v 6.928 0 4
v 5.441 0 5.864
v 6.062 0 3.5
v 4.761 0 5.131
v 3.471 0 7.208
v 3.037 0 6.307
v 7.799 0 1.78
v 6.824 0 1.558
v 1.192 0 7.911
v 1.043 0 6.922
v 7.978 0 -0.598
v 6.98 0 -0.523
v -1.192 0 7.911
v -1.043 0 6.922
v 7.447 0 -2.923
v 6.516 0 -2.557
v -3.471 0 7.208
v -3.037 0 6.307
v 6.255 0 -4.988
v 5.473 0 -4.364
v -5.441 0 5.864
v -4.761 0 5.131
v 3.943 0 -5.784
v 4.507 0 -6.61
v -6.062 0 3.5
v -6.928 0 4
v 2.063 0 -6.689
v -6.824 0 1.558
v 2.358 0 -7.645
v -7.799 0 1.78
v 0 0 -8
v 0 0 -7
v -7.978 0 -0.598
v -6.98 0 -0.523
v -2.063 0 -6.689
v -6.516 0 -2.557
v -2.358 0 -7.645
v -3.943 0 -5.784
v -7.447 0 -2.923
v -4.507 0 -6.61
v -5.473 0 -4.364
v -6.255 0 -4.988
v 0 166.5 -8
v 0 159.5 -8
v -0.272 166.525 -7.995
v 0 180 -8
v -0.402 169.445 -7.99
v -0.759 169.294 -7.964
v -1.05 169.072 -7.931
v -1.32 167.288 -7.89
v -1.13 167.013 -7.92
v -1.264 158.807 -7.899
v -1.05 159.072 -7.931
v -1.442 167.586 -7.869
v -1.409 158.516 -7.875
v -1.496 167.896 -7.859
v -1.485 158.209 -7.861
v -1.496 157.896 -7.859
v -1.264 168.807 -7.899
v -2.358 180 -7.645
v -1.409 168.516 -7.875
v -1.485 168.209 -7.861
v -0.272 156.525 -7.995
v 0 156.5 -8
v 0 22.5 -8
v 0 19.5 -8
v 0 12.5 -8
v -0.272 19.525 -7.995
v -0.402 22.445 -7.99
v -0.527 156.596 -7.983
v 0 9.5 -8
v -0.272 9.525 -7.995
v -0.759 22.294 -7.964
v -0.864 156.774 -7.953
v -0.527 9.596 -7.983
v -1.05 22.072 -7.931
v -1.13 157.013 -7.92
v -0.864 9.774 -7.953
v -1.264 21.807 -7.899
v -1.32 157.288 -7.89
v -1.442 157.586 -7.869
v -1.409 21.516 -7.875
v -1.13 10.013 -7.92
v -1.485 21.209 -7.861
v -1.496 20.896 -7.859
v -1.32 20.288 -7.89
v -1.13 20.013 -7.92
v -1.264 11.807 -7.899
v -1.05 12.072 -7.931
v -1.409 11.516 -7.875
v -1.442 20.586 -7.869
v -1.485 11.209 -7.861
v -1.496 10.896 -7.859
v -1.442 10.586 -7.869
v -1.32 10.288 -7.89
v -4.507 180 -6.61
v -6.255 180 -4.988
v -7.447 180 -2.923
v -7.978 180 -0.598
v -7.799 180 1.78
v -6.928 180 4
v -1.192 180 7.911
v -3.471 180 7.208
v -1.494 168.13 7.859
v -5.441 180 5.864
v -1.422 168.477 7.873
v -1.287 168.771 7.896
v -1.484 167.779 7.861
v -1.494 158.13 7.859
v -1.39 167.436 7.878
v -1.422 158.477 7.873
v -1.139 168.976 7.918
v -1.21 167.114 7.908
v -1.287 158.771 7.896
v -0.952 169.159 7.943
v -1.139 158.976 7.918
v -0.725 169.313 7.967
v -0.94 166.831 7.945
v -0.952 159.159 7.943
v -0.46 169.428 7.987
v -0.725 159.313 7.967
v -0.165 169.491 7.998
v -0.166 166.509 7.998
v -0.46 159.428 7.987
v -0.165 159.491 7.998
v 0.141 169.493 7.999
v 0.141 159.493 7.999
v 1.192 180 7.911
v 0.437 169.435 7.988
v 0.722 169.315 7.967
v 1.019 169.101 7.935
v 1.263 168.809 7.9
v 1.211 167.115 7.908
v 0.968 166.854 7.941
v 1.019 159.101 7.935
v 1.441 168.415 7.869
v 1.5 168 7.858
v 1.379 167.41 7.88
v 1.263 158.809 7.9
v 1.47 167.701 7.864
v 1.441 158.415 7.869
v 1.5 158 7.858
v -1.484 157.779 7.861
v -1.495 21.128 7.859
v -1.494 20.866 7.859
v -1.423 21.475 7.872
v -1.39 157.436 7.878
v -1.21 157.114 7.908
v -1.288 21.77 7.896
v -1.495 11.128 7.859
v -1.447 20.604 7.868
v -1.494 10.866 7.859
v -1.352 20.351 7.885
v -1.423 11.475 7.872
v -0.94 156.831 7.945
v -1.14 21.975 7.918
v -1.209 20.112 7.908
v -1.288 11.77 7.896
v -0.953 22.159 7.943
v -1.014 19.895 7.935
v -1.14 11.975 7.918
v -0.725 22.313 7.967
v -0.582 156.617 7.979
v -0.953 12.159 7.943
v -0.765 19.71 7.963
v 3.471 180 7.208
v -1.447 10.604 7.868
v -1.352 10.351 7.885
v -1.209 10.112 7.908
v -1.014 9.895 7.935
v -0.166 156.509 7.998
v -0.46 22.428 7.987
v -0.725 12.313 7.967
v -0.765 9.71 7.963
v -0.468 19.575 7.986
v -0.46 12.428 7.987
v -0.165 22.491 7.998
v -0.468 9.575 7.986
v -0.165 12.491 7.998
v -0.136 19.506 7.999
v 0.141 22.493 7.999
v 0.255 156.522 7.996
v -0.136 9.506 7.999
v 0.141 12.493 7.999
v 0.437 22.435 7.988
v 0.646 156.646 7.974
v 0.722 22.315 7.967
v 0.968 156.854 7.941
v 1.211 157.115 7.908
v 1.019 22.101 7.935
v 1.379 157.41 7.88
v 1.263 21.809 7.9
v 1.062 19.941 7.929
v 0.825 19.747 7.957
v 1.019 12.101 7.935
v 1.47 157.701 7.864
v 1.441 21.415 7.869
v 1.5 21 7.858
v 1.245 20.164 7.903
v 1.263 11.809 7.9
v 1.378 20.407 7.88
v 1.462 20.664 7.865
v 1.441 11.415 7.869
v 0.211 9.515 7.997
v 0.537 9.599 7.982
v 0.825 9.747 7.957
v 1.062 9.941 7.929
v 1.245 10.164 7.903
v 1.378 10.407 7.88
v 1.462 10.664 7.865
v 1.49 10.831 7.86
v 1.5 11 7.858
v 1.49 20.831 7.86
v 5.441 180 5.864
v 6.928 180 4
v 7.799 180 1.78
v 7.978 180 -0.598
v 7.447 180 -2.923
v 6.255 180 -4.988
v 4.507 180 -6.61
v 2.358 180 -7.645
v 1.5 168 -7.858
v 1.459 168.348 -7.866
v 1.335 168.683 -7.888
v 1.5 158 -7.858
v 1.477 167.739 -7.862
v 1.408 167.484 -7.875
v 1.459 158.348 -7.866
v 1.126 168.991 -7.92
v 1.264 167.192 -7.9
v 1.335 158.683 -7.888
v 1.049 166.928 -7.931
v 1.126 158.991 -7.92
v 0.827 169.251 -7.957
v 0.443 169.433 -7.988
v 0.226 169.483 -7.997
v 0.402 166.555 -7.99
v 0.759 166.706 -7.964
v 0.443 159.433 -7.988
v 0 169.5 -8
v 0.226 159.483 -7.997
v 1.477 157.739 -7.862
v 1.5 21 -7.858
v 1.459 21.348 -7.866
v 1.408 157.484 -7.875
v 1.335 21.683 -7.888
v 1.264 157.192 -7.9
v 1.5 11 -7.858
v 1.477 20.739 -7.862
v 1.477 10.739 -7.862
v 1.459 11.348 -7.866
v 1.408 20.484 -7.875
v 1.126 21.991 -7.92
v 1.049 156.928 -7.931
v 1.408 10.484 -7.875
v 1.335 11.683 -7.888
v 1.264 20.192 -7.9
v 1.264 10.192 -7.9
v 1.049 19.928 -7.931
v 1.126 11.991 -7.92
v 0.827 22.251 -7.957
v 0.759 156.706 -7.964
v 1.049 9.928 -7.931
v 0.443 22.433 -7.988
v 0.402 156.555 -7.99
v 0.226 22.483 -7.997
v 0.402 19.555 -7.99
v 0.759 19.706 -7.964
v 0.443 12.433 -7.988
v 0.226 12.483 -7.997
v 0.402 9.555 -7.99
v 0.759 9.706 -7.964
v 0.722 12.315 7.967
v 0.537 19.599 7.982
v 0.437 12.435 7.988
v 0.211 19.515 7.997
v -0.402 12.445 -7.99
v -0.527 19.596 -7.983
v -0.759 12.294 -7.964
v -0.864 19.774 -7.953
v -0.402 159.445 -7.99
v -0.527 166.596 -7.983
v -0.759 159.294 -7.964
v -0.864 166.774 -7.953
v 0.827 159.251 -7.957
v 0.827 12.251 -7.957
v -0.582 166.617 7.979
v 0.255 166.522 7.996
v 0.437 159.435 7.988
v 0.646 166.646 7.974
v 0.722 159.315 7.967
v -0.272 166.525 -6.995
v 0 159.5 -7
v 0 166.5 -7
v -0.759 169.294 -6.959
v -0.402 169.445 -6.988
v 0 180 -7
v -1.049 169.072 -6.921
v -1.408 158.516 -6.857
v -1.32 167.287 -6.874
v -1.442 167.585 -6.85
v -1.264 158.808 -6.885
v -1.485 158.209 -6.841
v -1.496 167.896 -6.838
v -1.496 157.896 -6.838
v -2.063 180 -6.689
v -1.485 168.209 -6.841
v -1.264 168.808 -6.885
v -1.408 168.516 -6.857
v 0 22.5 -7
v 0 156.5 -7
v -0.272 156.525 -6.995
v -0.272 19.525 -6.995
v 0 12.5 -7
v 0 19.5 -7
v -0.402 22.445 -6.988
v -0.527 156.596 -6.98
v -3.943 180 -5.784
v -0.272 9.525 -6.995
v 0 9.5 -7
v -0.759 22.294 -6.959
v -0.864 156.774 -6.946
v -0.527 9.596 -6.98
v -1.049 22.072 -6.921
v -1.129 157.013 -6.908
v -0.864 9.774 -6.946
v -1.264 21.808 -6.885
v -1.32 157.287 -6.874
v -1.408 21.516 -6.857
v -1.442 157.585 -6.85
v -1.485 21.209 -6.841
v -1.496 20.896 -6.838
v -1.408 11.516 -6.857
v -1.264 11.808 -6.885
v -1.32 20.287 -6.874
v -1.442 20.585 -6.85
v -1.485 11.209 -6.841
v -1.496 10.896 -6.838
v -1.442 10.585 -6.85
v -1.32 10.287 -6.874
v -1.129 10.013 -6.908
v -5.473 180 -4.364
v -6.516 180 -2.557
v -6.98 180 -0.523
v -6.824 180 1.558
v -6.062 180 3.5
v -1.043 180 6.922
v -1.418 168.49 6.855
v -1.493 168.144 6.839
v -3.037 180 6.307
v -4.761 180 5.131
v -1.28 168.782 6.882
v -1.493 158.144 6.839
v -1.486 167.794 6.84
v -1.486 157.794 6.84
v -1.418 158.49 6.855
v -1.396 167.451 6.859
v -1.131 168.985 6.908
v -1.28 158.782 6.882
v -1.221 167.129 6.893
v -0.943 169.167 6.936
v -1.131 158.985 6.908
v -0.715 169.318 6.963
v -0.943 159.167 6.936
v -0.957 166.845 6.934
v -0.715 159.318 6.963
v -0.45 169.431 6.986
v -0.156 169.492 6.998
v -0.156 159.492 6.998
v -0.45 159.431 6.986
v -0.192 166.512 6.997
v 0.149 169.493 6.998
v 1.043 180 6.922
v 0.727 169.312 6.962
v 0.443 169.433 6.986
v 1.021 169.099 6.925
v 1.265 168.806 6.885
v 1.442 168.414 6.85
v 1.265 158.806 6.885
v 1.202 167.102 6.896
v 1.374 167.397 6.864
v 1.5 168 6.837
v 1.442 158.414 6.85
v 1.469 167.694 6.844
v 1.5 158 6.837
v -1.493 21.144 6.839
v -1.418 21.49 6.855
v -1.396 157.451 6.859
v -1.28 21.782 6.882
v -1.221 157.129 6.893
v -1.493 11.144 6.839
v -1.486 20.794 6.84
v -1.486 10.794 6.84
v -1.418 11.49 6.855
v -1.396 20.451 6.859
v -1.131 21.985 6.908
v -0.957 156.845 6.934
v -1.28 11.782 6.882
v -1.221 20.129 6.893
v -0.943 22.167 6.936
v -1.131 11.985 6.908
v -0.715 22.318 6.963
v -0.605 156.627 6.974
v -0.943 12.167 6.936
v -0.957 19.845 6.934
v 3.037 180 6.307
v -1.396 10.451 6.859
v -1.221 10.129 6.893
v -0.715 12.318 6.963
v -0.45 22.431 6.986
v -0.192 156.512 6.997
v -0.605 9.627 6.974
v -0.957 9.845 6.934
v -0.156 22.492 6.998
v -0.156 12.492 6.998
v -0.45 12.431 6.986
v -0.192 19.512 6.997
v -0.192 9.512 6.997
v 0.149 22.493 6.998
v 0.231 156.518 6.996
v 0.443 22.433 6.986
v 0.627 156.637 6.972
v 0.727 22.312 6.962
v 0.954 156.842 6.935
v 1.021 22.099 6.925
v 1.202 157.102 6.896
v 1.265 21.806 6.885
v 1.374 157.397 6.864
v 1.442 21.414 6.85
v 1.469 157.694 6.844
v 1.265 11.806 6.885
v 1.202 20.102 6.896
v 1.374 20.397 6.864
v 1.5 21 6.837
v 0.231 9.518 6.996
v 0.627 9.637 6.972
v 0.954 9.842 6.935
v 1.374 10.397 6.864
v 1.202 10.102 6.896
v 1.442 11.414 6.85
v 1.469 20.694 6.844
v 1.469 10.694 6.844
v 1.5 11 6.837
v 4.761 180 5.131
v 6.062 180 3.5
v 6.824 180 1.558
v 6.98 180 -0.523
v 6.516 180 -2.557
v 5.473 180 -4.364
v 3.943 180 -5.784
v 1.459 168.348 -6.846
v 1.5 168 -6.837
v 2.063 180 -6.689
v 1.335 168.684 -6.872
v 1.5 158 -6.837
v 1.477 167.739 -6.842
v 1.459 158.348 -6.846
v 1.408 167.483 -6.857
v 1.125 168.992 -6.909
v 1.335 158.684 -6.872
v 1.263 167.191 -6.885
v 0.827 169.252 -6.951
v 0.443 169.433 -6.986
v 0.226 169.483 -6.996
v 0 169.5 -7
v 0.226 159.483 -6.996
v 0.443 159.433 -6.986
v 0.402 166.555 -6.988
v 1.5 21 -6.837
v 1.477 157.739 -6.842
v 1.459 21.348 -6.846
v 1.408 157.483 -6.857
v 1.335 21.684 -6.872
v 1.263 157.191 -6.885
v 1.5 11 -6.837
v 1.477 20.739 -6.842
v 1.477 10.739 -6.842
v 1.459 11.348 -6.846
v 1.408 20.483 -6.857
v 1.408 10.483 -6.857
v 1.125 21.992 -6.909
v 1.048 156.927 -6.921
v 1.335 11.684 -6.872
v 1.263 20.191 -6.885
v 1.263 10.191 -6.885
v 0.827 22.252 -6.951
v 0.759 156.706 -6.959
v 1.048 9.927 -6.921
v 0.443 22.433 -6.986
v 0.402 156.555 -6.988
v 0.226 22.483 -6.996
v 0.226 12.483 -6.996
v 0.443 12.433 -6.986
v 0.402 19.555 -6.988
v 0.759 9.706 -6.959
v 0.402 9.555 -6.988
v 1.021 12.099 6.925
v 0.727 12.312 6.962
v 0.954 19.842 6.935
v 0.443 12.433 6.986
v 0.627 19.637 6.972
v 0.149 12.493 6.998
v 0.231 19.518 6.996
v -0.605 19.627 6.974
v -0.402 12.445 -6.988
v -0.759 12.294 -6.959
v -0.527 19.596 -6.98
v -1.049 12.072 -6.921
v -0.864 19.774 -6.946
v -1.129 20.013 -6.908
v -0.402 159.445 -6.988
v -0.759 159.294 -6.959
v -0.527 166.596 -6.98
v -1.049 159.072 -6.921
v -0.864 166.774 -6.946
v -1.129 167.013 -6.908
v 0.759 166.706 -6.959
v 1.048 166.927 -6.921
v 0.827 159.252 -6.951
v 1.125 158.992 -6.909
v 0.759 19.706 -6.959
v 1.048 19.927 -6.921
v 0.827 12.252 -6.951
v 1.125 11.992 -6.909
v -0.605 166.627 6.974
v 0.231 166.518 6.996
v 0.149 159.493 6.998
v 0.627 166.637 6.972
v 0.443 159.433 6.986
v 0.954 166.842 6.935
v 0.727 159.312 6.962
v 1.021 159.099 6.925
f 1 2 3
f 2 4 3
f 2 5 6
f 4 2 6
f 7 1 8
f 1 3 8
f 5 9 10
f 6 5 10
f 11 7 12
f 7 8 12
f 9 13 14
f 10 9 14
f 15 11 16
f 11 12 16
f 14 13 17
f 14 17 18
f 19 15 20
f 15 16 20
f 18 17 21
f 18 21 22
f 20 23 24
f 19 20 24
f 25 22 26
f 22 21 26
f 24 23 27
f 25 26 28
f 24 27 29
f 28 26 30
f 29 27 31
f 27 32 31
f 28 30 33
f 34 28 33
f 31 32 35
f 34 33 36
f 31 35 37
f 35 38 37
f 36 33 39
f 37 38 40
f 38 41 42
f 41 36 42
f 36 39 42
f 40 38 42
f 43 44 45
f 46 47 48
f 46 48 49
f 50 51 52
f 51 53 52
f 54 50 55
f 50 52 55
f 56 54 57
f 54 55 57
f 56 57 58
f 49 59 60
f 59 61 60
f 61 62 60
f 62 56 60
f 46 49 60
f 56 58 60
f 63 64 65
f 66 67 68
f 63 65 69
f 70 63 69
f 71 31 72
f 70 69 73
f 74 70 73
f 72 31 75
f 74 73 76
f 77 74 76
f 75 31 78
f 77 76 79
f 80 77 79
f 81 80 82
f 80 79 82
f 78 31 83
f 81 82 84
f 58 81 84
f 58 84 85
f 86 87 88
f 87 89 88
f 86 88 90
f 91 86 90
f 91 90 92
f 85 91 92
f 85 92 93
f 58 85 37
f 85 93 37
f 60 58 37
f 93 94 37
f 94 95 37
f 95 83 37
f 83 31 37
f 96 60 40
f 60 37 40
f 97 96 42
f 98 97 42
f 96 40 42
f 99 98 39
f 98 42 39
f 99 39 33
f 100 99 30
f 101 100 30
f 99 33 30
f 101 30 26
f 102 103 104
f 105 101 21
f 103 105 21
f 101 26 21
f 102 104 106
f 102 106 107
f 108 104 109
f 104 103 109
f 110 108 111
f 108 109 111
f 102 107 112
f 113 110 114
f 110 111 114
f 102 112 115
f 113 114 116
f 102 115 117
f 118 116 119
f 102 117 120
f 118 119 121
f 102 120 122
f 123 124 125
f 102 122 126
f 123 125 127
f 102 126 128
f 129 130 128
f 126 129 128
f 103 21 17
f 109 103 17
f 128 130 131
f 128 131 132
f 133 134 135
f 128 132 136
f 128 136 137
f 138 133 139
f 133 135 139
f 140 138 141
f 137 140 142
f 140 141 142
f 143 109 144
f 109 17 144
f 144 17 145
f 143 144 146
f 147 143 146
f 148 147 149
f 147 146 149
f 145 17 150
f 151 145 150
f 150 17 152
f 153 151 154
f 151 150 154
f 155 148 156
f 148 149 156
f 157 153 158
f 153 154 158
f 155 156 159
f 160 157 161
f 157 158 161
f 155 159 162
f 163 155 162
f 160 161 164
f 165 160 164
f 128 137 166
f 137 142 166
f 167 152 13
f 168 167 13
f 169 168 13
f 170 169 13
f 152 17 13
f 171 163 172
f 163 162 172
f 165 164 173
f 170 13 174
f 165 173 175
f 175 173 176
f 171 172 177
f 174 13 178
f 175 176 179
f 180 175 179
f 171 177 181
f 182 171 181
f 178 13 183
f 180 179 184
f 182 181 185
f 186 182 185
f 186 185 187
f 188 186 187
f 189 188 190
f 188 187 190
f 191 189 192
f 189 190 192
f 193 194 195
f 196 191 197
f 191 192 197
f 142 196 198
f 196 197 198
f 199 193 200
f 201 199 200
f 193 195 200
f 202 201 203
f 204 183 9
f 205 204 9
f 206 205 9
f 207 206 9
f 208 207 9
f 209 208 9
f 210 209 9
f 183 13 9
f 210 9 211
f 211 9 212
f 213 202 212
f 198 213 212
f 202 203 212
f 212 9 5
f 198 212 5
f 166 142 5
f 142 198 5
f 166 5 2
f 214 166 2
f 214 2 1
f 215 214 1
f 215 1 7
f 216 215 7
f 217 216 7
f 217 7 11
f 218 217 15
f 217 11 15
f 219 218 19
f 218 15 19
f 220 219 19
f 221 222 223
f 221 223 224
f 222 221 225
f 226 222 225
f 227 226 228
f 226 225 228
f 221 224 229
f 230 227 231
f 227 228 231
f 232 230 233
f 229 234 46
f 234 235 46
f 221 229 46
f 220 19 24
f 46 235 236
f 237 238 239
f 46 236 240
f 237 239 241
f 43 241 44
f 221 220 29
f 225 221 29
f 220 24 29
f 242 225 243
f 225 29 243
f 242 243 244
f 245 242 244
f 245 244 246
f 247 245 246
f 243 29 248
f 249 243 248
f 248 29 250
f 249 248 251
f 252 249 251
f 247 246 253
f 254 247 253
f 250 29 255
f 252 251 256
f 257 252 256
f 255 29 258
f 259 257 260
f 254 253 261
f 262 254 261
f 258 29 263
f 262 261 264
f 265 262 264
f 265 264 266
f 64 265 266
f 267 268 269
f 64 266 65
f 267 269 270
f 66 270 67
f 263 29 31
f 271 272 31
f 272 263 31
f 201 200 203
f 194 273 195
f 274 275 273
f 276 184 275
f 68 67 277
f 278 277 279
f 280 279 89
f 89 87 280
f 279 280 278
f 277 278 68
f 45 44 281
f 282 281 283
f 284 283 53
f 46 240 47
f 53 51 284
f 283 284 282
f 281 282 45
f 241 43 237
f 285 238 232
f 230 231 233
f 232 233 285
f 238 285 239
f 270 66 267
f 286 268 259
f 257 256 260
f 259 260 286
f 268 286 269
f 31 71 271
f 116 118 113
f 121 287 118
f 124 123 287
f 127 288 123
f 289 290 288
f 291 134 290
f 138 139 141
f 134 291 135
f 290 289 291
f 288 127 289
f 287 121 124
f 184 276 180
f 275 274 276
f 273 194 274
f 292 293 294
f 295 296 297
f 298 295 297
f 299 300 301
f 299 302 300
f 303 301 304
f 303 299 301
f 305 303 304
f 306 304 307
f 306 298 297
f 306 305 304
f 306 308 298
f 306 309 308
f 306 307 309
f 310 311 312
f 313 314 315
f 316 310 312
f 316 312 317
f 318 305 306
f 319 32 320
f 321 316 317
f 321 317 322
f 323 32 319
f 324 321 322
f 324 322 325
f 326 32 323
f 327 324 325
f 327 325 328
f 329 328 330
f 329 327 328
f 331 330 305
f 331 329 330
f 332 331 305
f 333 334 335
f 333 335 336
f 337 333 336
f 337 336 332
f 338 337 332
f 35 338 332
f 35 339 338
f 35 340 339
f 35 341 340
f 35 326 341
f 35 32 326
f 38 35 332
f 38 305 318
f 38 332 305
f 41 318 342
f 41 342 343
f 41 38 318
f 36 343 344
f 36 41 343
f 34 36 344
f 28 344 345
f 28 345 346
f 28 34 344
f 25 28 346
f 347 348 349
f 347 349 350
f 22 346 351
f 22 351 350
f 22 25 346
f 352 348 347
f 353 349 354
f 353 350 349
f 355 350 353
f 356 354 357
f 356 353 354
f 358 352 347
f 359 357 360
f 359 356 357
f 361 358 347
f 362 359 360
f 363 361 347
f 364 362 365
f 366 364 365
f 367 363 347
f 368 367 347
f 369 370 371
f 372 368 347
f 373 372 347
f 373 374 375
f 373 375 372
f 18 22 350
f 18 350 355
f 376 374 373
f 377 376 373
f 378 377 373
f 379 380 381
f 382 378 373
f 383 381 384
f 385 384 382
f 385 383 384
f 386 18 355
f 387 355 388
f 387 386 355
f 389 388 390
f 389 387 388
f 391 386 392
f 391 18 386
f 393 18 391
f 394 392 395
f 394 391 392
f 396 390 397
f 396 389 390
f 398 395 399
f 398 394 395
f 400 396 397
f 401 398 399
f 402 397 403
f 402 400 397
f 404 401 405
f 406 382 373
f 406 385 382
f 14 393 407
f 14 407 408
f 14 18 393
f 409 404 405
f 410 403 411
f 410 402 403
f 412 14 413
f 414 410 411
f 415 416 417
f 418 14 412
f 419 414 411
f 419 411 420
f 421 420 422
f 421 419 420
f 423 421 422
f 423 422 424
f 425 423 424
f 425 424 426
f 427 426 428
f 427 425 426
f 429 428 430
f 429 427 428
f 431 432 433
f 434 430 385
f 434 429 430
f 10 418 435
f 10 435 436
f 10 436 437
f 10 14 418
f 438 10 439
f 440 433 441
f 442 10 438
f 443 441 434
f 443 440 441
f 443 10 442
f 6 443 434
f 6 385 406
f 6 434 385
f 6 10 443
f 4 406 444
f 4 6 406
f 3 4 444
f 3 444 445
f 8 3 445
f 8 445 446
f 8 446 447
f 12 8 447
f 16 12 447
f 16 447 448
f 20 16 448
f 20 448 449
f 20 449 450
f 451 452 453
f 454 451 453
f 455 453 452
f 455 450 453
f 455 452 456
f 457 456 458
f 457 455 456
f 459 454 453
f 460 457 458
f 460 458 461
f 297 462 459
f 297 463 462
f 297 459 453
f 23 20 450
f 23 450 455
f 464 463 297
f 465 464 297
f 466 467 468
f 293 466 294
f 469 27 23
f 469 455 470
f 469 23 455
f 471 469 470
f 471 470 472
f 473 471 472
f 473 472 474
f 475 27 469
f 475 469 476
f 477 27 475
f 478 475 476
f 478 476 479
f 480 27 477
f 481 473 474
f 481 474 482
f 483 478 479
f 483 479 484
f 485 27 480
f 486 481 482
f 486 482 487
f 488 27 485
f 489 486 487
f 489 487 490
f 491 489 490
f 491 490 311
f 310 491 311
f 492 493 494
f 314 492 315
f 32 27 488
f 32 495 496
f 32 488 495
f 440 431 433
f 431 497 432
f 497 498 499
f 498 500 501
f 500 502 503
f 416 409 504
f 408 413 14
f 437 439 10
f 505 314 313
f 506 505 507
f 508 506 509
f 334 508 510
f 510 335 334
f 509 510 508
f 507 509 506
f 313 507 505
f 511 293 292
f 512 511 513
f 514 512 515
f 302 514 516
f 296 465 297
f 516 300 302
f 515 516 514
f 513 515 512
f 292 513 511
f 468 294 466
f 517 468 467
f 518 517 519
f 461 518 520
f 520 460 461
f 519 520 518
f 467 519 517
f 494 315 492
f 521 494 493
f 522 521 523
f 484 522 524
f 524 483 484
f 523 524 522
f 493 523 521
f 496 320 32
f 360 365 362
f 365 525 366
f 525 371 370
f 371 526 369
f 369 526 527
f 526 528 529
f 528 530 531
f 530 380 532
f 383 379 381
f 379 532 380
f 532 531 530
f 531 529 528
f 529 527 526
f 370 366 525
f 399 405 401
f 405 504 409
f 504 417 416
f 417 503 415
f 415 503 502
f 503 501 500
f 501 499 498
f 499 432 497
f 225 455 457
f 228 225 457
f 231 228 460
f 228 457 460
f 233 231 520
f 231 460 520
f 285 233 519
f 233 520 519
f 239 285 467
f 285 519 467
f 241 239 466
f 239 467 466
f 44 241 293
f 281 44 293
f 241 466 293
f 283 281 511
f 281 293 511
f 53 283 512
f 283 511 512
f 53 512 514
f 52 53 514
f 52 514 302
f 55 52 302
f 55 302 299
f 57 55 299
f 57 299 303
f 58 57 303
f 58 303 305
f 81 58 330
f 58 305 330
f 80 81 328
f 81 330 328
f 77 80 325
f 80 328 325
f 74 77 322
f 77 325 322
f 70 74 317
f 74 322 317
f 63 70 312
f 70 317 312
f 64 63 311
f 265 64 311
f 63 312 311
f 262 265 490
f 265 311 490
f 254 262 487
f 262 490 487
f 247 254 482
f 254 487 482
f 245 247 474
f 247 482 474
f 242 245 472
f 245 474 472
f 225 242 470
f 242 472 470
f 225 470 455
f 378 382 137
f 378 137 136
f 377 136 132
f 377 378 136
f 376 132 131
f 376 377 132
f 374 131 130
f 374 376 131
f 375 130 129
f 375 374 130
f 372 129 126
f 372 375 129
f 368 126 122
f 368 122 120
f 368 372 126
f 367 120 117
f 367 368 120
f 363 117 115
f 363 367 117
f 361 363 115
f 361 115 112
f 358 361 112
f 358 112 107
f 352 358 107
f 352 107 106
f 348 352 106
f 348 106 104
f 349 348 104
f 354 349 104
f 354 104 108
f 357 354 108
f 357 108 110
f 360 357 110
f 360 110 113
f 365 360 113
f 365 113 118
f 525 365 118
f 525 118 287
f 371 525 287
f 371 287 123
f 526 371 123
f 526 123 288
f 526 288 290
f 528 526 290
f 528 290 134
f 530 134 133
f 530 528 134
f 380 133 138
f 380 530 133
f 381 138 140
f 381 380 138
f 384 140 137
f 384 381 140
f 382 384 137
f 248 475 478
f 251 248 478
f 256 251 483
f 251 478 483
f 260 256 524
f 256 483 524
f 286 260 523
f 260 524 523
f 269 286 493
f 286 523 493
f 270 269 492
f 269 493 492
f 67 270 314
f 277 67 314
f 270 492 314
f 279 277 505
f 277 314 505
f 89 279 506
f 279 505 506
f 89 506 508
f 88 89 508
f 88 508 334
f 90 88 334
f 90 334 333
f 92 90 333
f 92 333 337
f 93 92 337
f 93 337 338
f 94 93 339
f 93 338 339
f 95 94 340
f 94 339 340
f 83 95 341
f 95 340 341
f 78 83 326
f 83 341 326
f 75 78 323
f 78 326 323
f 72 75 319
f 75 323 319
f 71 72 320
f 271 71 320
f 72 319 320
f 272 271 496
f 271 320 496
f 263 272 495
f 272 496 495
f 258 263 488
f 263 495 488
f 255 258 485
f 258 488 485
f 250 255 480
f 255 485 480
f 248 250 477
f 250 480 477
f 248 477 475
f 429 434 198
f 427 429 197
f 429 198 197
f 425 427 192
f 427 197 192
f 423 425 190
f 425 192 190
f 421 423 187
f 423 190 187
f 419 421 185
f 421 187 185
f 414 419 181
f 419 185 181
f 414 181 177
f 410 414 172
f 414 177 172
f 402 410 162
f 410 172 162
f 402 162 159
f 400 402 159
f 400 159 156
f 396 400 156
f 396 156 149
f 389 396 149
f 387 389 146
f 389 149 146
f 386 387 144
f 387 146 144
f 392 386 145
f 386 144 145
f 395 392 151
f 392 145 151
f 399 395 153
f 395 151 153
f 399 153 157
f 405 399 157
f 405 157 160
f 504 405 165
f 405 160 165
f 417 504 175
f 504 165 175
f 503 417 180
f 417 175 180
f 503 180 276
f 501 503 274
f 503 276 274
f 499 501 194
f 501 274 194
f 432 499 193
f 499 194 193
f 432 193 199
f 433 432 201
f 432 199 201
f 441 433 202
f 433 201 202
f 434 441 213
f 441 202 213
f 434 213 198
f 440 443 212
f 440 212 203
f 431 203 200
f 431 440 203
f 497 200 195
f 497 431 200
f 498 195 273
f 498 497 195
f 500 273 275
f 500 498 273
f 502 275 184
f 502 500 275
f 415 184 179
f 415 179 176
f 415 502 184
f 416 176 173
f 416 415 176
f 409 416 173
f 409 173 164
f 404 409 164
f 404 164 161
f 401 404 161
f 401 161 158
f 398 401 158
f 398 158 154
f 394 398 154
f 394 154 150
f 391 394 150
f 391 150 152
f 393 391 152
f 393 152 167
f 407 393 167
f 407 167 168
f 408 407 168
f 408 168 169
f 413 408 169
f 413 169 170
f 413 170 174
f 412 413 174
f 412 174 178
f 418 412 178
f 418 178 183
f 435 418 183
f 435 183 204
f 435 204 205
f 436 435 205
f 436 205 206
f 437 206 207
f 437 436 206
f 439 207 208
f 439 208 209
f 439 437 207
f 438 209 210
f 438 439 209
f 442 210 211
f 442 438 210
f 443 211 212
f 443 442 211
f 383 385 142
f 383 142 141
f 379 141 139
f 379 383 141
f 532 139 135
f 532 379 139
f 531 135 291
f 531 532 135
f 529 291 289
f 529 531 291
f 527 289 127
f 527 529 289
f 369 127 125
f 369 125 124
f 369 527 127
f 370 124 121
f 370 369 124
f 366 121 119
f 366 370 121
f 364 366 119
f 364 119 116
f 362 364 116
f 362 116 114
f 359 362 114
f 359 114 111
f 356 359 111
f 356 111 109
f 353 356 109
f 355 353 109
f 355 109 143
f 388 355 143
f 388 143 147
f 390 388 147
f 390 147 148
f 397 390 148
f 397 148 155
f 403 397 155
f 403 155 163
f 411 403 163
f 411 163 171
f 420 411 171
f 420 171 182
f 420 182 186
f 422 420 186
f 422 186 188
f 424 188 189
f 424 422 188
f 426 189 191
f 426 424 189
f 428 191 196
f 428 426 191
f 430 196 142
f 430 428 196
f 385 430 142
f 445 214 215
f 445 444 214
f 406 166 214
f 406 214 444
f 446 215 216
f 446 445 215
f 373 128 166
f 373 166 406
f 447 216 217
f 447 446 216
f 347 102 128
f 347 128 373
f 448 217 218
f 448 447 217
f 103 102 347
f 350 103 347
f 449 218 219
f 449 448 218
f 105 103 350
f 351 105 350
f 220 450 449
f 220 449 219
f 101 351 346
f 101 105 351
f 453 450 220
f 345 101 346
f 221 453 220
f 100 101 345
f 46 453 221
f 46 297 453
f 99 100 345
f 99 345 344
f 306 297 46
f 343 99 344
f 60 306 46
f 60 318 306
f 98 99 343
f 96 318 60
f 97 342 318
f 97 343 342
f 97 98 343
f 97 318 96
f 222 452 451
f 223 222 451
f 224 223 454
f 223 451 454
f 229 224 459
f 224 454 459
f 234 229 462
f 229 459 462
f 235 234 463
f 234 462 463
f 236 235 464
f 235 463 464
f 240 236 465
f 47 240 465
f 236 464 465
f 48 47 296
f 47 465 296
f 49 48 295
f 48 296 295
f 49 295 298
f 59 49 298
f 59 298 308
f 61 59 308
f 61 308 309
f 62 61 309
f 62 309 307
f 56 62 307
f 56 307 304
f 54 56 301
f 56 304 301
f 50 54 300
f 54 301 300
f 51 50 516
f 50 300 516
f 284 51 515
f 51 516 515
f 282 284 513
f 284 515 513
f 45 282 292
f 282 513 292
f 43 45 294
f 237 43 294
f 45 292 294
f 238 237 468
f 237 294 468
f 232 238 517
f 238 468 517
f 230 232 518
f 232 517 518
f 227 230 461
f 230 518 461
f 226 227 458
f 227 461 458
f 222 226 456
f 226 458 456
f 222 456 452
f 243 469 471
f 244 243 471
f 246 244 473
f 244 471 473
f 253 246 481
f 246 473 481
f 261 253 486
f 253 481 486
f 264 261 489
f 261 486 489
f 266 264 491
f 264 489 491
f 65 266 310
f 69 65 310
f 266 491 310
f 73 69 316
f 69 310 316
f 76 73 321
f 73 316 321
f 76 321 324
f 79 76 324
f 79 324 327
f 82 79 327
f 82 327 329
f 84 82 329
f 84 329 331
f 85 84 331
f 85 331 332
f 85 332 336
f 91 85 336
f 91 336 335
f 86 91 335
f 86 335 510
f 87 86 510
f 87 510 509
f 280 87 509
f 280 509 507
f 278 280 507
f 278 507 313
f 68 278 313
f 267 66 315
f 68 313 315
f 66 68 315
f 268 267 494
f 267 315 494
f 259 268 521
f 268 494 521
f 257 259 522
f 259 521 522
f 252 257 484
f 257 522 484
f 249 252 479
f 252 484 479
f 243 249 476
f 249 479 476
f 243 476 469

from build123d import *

# Parameters (mm, degrees)
IZIM1_R                     = 8
IZIM1_R_2                   = 7
Y_KSEKLIK_EKSTR_ZYON1_DEPTH = 180
IZIM2_R                     = 1.5
KES_EKSTR_ZYON1_DEPTH       = 10


with BuildPart() as part:
    # Çizim1 → Yükseklik-Ekstrüzyon1 (new body)
    with BuildSketch(Plane(origin=(0, 0, 0), x_dir=(1, 0, 0), z_dir=(0, 1, 0))):
        with Locations(Location((0, 0, 0), (0, 0, 90))):
            Circle(IZIM1_R)
        with Locations(Location((0, 0, 0), (0, 0, 90))):
            Circle(IZIM1_R_2, mode=Mode.SUBTRACT)
    extrude(amount=Y_KSEKLIK_EKSTR_ZYON1_DEPTH)

    # Çizim2 → Kes-Ekstrüzyon1 (cut, symmetric)
    with BuildSketch(Plane.XY):
        with Locations((0, 11)):
            Circle(IZIM2_R)
        with Locations((0, 168)):
            Circle(IZIM2_R)
        with Locations((0, 158)):
            Circle(IZIM2_R)
        with Locations((0, 21)):
            Circle(IZIM2_R)
    extrude(amount=KES_EKSTR_ZYON1_DEPTH, both=True, mode=Mode.SUBTRACT)


solid = part.part
